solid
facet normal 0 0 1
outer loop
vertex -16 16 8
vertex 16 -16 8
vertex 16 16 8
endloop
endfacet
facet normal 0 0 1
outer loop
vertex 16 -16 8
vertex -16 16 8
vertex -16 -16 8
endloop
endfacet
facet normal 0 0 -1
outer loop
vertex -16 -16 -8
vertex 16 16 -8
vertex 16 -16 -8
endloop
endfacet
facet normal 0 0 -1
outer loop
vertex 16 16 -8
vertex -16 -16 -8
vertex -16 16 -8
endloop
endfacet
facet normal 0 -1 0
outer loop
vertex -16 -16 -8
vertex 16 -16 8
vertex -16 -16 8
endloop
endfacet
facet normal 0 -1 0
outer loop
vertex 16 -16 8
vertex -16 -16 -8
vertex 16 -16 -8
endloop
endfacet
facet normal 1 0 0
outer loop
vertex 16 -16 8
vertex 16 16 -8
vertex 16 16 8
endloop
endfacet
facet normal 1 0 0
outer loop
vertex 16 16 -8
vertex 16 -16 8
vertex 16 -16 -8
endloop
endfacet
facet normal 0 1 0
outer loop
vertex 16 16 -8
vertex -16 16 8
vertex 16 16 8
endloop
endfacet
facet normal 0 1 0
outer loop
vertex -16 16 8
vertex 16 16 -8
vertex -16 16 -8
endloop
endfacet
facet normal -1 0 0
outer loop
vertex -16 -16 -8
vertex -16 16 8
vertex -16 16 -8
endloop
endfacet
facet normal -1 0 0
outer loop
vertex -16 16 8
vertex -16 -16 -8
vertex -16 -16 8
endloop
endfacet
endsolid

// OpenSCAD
size = 32;//block=32 //item=8

cube([size * 1, size * 1, size * 0.5], center = true);//base
